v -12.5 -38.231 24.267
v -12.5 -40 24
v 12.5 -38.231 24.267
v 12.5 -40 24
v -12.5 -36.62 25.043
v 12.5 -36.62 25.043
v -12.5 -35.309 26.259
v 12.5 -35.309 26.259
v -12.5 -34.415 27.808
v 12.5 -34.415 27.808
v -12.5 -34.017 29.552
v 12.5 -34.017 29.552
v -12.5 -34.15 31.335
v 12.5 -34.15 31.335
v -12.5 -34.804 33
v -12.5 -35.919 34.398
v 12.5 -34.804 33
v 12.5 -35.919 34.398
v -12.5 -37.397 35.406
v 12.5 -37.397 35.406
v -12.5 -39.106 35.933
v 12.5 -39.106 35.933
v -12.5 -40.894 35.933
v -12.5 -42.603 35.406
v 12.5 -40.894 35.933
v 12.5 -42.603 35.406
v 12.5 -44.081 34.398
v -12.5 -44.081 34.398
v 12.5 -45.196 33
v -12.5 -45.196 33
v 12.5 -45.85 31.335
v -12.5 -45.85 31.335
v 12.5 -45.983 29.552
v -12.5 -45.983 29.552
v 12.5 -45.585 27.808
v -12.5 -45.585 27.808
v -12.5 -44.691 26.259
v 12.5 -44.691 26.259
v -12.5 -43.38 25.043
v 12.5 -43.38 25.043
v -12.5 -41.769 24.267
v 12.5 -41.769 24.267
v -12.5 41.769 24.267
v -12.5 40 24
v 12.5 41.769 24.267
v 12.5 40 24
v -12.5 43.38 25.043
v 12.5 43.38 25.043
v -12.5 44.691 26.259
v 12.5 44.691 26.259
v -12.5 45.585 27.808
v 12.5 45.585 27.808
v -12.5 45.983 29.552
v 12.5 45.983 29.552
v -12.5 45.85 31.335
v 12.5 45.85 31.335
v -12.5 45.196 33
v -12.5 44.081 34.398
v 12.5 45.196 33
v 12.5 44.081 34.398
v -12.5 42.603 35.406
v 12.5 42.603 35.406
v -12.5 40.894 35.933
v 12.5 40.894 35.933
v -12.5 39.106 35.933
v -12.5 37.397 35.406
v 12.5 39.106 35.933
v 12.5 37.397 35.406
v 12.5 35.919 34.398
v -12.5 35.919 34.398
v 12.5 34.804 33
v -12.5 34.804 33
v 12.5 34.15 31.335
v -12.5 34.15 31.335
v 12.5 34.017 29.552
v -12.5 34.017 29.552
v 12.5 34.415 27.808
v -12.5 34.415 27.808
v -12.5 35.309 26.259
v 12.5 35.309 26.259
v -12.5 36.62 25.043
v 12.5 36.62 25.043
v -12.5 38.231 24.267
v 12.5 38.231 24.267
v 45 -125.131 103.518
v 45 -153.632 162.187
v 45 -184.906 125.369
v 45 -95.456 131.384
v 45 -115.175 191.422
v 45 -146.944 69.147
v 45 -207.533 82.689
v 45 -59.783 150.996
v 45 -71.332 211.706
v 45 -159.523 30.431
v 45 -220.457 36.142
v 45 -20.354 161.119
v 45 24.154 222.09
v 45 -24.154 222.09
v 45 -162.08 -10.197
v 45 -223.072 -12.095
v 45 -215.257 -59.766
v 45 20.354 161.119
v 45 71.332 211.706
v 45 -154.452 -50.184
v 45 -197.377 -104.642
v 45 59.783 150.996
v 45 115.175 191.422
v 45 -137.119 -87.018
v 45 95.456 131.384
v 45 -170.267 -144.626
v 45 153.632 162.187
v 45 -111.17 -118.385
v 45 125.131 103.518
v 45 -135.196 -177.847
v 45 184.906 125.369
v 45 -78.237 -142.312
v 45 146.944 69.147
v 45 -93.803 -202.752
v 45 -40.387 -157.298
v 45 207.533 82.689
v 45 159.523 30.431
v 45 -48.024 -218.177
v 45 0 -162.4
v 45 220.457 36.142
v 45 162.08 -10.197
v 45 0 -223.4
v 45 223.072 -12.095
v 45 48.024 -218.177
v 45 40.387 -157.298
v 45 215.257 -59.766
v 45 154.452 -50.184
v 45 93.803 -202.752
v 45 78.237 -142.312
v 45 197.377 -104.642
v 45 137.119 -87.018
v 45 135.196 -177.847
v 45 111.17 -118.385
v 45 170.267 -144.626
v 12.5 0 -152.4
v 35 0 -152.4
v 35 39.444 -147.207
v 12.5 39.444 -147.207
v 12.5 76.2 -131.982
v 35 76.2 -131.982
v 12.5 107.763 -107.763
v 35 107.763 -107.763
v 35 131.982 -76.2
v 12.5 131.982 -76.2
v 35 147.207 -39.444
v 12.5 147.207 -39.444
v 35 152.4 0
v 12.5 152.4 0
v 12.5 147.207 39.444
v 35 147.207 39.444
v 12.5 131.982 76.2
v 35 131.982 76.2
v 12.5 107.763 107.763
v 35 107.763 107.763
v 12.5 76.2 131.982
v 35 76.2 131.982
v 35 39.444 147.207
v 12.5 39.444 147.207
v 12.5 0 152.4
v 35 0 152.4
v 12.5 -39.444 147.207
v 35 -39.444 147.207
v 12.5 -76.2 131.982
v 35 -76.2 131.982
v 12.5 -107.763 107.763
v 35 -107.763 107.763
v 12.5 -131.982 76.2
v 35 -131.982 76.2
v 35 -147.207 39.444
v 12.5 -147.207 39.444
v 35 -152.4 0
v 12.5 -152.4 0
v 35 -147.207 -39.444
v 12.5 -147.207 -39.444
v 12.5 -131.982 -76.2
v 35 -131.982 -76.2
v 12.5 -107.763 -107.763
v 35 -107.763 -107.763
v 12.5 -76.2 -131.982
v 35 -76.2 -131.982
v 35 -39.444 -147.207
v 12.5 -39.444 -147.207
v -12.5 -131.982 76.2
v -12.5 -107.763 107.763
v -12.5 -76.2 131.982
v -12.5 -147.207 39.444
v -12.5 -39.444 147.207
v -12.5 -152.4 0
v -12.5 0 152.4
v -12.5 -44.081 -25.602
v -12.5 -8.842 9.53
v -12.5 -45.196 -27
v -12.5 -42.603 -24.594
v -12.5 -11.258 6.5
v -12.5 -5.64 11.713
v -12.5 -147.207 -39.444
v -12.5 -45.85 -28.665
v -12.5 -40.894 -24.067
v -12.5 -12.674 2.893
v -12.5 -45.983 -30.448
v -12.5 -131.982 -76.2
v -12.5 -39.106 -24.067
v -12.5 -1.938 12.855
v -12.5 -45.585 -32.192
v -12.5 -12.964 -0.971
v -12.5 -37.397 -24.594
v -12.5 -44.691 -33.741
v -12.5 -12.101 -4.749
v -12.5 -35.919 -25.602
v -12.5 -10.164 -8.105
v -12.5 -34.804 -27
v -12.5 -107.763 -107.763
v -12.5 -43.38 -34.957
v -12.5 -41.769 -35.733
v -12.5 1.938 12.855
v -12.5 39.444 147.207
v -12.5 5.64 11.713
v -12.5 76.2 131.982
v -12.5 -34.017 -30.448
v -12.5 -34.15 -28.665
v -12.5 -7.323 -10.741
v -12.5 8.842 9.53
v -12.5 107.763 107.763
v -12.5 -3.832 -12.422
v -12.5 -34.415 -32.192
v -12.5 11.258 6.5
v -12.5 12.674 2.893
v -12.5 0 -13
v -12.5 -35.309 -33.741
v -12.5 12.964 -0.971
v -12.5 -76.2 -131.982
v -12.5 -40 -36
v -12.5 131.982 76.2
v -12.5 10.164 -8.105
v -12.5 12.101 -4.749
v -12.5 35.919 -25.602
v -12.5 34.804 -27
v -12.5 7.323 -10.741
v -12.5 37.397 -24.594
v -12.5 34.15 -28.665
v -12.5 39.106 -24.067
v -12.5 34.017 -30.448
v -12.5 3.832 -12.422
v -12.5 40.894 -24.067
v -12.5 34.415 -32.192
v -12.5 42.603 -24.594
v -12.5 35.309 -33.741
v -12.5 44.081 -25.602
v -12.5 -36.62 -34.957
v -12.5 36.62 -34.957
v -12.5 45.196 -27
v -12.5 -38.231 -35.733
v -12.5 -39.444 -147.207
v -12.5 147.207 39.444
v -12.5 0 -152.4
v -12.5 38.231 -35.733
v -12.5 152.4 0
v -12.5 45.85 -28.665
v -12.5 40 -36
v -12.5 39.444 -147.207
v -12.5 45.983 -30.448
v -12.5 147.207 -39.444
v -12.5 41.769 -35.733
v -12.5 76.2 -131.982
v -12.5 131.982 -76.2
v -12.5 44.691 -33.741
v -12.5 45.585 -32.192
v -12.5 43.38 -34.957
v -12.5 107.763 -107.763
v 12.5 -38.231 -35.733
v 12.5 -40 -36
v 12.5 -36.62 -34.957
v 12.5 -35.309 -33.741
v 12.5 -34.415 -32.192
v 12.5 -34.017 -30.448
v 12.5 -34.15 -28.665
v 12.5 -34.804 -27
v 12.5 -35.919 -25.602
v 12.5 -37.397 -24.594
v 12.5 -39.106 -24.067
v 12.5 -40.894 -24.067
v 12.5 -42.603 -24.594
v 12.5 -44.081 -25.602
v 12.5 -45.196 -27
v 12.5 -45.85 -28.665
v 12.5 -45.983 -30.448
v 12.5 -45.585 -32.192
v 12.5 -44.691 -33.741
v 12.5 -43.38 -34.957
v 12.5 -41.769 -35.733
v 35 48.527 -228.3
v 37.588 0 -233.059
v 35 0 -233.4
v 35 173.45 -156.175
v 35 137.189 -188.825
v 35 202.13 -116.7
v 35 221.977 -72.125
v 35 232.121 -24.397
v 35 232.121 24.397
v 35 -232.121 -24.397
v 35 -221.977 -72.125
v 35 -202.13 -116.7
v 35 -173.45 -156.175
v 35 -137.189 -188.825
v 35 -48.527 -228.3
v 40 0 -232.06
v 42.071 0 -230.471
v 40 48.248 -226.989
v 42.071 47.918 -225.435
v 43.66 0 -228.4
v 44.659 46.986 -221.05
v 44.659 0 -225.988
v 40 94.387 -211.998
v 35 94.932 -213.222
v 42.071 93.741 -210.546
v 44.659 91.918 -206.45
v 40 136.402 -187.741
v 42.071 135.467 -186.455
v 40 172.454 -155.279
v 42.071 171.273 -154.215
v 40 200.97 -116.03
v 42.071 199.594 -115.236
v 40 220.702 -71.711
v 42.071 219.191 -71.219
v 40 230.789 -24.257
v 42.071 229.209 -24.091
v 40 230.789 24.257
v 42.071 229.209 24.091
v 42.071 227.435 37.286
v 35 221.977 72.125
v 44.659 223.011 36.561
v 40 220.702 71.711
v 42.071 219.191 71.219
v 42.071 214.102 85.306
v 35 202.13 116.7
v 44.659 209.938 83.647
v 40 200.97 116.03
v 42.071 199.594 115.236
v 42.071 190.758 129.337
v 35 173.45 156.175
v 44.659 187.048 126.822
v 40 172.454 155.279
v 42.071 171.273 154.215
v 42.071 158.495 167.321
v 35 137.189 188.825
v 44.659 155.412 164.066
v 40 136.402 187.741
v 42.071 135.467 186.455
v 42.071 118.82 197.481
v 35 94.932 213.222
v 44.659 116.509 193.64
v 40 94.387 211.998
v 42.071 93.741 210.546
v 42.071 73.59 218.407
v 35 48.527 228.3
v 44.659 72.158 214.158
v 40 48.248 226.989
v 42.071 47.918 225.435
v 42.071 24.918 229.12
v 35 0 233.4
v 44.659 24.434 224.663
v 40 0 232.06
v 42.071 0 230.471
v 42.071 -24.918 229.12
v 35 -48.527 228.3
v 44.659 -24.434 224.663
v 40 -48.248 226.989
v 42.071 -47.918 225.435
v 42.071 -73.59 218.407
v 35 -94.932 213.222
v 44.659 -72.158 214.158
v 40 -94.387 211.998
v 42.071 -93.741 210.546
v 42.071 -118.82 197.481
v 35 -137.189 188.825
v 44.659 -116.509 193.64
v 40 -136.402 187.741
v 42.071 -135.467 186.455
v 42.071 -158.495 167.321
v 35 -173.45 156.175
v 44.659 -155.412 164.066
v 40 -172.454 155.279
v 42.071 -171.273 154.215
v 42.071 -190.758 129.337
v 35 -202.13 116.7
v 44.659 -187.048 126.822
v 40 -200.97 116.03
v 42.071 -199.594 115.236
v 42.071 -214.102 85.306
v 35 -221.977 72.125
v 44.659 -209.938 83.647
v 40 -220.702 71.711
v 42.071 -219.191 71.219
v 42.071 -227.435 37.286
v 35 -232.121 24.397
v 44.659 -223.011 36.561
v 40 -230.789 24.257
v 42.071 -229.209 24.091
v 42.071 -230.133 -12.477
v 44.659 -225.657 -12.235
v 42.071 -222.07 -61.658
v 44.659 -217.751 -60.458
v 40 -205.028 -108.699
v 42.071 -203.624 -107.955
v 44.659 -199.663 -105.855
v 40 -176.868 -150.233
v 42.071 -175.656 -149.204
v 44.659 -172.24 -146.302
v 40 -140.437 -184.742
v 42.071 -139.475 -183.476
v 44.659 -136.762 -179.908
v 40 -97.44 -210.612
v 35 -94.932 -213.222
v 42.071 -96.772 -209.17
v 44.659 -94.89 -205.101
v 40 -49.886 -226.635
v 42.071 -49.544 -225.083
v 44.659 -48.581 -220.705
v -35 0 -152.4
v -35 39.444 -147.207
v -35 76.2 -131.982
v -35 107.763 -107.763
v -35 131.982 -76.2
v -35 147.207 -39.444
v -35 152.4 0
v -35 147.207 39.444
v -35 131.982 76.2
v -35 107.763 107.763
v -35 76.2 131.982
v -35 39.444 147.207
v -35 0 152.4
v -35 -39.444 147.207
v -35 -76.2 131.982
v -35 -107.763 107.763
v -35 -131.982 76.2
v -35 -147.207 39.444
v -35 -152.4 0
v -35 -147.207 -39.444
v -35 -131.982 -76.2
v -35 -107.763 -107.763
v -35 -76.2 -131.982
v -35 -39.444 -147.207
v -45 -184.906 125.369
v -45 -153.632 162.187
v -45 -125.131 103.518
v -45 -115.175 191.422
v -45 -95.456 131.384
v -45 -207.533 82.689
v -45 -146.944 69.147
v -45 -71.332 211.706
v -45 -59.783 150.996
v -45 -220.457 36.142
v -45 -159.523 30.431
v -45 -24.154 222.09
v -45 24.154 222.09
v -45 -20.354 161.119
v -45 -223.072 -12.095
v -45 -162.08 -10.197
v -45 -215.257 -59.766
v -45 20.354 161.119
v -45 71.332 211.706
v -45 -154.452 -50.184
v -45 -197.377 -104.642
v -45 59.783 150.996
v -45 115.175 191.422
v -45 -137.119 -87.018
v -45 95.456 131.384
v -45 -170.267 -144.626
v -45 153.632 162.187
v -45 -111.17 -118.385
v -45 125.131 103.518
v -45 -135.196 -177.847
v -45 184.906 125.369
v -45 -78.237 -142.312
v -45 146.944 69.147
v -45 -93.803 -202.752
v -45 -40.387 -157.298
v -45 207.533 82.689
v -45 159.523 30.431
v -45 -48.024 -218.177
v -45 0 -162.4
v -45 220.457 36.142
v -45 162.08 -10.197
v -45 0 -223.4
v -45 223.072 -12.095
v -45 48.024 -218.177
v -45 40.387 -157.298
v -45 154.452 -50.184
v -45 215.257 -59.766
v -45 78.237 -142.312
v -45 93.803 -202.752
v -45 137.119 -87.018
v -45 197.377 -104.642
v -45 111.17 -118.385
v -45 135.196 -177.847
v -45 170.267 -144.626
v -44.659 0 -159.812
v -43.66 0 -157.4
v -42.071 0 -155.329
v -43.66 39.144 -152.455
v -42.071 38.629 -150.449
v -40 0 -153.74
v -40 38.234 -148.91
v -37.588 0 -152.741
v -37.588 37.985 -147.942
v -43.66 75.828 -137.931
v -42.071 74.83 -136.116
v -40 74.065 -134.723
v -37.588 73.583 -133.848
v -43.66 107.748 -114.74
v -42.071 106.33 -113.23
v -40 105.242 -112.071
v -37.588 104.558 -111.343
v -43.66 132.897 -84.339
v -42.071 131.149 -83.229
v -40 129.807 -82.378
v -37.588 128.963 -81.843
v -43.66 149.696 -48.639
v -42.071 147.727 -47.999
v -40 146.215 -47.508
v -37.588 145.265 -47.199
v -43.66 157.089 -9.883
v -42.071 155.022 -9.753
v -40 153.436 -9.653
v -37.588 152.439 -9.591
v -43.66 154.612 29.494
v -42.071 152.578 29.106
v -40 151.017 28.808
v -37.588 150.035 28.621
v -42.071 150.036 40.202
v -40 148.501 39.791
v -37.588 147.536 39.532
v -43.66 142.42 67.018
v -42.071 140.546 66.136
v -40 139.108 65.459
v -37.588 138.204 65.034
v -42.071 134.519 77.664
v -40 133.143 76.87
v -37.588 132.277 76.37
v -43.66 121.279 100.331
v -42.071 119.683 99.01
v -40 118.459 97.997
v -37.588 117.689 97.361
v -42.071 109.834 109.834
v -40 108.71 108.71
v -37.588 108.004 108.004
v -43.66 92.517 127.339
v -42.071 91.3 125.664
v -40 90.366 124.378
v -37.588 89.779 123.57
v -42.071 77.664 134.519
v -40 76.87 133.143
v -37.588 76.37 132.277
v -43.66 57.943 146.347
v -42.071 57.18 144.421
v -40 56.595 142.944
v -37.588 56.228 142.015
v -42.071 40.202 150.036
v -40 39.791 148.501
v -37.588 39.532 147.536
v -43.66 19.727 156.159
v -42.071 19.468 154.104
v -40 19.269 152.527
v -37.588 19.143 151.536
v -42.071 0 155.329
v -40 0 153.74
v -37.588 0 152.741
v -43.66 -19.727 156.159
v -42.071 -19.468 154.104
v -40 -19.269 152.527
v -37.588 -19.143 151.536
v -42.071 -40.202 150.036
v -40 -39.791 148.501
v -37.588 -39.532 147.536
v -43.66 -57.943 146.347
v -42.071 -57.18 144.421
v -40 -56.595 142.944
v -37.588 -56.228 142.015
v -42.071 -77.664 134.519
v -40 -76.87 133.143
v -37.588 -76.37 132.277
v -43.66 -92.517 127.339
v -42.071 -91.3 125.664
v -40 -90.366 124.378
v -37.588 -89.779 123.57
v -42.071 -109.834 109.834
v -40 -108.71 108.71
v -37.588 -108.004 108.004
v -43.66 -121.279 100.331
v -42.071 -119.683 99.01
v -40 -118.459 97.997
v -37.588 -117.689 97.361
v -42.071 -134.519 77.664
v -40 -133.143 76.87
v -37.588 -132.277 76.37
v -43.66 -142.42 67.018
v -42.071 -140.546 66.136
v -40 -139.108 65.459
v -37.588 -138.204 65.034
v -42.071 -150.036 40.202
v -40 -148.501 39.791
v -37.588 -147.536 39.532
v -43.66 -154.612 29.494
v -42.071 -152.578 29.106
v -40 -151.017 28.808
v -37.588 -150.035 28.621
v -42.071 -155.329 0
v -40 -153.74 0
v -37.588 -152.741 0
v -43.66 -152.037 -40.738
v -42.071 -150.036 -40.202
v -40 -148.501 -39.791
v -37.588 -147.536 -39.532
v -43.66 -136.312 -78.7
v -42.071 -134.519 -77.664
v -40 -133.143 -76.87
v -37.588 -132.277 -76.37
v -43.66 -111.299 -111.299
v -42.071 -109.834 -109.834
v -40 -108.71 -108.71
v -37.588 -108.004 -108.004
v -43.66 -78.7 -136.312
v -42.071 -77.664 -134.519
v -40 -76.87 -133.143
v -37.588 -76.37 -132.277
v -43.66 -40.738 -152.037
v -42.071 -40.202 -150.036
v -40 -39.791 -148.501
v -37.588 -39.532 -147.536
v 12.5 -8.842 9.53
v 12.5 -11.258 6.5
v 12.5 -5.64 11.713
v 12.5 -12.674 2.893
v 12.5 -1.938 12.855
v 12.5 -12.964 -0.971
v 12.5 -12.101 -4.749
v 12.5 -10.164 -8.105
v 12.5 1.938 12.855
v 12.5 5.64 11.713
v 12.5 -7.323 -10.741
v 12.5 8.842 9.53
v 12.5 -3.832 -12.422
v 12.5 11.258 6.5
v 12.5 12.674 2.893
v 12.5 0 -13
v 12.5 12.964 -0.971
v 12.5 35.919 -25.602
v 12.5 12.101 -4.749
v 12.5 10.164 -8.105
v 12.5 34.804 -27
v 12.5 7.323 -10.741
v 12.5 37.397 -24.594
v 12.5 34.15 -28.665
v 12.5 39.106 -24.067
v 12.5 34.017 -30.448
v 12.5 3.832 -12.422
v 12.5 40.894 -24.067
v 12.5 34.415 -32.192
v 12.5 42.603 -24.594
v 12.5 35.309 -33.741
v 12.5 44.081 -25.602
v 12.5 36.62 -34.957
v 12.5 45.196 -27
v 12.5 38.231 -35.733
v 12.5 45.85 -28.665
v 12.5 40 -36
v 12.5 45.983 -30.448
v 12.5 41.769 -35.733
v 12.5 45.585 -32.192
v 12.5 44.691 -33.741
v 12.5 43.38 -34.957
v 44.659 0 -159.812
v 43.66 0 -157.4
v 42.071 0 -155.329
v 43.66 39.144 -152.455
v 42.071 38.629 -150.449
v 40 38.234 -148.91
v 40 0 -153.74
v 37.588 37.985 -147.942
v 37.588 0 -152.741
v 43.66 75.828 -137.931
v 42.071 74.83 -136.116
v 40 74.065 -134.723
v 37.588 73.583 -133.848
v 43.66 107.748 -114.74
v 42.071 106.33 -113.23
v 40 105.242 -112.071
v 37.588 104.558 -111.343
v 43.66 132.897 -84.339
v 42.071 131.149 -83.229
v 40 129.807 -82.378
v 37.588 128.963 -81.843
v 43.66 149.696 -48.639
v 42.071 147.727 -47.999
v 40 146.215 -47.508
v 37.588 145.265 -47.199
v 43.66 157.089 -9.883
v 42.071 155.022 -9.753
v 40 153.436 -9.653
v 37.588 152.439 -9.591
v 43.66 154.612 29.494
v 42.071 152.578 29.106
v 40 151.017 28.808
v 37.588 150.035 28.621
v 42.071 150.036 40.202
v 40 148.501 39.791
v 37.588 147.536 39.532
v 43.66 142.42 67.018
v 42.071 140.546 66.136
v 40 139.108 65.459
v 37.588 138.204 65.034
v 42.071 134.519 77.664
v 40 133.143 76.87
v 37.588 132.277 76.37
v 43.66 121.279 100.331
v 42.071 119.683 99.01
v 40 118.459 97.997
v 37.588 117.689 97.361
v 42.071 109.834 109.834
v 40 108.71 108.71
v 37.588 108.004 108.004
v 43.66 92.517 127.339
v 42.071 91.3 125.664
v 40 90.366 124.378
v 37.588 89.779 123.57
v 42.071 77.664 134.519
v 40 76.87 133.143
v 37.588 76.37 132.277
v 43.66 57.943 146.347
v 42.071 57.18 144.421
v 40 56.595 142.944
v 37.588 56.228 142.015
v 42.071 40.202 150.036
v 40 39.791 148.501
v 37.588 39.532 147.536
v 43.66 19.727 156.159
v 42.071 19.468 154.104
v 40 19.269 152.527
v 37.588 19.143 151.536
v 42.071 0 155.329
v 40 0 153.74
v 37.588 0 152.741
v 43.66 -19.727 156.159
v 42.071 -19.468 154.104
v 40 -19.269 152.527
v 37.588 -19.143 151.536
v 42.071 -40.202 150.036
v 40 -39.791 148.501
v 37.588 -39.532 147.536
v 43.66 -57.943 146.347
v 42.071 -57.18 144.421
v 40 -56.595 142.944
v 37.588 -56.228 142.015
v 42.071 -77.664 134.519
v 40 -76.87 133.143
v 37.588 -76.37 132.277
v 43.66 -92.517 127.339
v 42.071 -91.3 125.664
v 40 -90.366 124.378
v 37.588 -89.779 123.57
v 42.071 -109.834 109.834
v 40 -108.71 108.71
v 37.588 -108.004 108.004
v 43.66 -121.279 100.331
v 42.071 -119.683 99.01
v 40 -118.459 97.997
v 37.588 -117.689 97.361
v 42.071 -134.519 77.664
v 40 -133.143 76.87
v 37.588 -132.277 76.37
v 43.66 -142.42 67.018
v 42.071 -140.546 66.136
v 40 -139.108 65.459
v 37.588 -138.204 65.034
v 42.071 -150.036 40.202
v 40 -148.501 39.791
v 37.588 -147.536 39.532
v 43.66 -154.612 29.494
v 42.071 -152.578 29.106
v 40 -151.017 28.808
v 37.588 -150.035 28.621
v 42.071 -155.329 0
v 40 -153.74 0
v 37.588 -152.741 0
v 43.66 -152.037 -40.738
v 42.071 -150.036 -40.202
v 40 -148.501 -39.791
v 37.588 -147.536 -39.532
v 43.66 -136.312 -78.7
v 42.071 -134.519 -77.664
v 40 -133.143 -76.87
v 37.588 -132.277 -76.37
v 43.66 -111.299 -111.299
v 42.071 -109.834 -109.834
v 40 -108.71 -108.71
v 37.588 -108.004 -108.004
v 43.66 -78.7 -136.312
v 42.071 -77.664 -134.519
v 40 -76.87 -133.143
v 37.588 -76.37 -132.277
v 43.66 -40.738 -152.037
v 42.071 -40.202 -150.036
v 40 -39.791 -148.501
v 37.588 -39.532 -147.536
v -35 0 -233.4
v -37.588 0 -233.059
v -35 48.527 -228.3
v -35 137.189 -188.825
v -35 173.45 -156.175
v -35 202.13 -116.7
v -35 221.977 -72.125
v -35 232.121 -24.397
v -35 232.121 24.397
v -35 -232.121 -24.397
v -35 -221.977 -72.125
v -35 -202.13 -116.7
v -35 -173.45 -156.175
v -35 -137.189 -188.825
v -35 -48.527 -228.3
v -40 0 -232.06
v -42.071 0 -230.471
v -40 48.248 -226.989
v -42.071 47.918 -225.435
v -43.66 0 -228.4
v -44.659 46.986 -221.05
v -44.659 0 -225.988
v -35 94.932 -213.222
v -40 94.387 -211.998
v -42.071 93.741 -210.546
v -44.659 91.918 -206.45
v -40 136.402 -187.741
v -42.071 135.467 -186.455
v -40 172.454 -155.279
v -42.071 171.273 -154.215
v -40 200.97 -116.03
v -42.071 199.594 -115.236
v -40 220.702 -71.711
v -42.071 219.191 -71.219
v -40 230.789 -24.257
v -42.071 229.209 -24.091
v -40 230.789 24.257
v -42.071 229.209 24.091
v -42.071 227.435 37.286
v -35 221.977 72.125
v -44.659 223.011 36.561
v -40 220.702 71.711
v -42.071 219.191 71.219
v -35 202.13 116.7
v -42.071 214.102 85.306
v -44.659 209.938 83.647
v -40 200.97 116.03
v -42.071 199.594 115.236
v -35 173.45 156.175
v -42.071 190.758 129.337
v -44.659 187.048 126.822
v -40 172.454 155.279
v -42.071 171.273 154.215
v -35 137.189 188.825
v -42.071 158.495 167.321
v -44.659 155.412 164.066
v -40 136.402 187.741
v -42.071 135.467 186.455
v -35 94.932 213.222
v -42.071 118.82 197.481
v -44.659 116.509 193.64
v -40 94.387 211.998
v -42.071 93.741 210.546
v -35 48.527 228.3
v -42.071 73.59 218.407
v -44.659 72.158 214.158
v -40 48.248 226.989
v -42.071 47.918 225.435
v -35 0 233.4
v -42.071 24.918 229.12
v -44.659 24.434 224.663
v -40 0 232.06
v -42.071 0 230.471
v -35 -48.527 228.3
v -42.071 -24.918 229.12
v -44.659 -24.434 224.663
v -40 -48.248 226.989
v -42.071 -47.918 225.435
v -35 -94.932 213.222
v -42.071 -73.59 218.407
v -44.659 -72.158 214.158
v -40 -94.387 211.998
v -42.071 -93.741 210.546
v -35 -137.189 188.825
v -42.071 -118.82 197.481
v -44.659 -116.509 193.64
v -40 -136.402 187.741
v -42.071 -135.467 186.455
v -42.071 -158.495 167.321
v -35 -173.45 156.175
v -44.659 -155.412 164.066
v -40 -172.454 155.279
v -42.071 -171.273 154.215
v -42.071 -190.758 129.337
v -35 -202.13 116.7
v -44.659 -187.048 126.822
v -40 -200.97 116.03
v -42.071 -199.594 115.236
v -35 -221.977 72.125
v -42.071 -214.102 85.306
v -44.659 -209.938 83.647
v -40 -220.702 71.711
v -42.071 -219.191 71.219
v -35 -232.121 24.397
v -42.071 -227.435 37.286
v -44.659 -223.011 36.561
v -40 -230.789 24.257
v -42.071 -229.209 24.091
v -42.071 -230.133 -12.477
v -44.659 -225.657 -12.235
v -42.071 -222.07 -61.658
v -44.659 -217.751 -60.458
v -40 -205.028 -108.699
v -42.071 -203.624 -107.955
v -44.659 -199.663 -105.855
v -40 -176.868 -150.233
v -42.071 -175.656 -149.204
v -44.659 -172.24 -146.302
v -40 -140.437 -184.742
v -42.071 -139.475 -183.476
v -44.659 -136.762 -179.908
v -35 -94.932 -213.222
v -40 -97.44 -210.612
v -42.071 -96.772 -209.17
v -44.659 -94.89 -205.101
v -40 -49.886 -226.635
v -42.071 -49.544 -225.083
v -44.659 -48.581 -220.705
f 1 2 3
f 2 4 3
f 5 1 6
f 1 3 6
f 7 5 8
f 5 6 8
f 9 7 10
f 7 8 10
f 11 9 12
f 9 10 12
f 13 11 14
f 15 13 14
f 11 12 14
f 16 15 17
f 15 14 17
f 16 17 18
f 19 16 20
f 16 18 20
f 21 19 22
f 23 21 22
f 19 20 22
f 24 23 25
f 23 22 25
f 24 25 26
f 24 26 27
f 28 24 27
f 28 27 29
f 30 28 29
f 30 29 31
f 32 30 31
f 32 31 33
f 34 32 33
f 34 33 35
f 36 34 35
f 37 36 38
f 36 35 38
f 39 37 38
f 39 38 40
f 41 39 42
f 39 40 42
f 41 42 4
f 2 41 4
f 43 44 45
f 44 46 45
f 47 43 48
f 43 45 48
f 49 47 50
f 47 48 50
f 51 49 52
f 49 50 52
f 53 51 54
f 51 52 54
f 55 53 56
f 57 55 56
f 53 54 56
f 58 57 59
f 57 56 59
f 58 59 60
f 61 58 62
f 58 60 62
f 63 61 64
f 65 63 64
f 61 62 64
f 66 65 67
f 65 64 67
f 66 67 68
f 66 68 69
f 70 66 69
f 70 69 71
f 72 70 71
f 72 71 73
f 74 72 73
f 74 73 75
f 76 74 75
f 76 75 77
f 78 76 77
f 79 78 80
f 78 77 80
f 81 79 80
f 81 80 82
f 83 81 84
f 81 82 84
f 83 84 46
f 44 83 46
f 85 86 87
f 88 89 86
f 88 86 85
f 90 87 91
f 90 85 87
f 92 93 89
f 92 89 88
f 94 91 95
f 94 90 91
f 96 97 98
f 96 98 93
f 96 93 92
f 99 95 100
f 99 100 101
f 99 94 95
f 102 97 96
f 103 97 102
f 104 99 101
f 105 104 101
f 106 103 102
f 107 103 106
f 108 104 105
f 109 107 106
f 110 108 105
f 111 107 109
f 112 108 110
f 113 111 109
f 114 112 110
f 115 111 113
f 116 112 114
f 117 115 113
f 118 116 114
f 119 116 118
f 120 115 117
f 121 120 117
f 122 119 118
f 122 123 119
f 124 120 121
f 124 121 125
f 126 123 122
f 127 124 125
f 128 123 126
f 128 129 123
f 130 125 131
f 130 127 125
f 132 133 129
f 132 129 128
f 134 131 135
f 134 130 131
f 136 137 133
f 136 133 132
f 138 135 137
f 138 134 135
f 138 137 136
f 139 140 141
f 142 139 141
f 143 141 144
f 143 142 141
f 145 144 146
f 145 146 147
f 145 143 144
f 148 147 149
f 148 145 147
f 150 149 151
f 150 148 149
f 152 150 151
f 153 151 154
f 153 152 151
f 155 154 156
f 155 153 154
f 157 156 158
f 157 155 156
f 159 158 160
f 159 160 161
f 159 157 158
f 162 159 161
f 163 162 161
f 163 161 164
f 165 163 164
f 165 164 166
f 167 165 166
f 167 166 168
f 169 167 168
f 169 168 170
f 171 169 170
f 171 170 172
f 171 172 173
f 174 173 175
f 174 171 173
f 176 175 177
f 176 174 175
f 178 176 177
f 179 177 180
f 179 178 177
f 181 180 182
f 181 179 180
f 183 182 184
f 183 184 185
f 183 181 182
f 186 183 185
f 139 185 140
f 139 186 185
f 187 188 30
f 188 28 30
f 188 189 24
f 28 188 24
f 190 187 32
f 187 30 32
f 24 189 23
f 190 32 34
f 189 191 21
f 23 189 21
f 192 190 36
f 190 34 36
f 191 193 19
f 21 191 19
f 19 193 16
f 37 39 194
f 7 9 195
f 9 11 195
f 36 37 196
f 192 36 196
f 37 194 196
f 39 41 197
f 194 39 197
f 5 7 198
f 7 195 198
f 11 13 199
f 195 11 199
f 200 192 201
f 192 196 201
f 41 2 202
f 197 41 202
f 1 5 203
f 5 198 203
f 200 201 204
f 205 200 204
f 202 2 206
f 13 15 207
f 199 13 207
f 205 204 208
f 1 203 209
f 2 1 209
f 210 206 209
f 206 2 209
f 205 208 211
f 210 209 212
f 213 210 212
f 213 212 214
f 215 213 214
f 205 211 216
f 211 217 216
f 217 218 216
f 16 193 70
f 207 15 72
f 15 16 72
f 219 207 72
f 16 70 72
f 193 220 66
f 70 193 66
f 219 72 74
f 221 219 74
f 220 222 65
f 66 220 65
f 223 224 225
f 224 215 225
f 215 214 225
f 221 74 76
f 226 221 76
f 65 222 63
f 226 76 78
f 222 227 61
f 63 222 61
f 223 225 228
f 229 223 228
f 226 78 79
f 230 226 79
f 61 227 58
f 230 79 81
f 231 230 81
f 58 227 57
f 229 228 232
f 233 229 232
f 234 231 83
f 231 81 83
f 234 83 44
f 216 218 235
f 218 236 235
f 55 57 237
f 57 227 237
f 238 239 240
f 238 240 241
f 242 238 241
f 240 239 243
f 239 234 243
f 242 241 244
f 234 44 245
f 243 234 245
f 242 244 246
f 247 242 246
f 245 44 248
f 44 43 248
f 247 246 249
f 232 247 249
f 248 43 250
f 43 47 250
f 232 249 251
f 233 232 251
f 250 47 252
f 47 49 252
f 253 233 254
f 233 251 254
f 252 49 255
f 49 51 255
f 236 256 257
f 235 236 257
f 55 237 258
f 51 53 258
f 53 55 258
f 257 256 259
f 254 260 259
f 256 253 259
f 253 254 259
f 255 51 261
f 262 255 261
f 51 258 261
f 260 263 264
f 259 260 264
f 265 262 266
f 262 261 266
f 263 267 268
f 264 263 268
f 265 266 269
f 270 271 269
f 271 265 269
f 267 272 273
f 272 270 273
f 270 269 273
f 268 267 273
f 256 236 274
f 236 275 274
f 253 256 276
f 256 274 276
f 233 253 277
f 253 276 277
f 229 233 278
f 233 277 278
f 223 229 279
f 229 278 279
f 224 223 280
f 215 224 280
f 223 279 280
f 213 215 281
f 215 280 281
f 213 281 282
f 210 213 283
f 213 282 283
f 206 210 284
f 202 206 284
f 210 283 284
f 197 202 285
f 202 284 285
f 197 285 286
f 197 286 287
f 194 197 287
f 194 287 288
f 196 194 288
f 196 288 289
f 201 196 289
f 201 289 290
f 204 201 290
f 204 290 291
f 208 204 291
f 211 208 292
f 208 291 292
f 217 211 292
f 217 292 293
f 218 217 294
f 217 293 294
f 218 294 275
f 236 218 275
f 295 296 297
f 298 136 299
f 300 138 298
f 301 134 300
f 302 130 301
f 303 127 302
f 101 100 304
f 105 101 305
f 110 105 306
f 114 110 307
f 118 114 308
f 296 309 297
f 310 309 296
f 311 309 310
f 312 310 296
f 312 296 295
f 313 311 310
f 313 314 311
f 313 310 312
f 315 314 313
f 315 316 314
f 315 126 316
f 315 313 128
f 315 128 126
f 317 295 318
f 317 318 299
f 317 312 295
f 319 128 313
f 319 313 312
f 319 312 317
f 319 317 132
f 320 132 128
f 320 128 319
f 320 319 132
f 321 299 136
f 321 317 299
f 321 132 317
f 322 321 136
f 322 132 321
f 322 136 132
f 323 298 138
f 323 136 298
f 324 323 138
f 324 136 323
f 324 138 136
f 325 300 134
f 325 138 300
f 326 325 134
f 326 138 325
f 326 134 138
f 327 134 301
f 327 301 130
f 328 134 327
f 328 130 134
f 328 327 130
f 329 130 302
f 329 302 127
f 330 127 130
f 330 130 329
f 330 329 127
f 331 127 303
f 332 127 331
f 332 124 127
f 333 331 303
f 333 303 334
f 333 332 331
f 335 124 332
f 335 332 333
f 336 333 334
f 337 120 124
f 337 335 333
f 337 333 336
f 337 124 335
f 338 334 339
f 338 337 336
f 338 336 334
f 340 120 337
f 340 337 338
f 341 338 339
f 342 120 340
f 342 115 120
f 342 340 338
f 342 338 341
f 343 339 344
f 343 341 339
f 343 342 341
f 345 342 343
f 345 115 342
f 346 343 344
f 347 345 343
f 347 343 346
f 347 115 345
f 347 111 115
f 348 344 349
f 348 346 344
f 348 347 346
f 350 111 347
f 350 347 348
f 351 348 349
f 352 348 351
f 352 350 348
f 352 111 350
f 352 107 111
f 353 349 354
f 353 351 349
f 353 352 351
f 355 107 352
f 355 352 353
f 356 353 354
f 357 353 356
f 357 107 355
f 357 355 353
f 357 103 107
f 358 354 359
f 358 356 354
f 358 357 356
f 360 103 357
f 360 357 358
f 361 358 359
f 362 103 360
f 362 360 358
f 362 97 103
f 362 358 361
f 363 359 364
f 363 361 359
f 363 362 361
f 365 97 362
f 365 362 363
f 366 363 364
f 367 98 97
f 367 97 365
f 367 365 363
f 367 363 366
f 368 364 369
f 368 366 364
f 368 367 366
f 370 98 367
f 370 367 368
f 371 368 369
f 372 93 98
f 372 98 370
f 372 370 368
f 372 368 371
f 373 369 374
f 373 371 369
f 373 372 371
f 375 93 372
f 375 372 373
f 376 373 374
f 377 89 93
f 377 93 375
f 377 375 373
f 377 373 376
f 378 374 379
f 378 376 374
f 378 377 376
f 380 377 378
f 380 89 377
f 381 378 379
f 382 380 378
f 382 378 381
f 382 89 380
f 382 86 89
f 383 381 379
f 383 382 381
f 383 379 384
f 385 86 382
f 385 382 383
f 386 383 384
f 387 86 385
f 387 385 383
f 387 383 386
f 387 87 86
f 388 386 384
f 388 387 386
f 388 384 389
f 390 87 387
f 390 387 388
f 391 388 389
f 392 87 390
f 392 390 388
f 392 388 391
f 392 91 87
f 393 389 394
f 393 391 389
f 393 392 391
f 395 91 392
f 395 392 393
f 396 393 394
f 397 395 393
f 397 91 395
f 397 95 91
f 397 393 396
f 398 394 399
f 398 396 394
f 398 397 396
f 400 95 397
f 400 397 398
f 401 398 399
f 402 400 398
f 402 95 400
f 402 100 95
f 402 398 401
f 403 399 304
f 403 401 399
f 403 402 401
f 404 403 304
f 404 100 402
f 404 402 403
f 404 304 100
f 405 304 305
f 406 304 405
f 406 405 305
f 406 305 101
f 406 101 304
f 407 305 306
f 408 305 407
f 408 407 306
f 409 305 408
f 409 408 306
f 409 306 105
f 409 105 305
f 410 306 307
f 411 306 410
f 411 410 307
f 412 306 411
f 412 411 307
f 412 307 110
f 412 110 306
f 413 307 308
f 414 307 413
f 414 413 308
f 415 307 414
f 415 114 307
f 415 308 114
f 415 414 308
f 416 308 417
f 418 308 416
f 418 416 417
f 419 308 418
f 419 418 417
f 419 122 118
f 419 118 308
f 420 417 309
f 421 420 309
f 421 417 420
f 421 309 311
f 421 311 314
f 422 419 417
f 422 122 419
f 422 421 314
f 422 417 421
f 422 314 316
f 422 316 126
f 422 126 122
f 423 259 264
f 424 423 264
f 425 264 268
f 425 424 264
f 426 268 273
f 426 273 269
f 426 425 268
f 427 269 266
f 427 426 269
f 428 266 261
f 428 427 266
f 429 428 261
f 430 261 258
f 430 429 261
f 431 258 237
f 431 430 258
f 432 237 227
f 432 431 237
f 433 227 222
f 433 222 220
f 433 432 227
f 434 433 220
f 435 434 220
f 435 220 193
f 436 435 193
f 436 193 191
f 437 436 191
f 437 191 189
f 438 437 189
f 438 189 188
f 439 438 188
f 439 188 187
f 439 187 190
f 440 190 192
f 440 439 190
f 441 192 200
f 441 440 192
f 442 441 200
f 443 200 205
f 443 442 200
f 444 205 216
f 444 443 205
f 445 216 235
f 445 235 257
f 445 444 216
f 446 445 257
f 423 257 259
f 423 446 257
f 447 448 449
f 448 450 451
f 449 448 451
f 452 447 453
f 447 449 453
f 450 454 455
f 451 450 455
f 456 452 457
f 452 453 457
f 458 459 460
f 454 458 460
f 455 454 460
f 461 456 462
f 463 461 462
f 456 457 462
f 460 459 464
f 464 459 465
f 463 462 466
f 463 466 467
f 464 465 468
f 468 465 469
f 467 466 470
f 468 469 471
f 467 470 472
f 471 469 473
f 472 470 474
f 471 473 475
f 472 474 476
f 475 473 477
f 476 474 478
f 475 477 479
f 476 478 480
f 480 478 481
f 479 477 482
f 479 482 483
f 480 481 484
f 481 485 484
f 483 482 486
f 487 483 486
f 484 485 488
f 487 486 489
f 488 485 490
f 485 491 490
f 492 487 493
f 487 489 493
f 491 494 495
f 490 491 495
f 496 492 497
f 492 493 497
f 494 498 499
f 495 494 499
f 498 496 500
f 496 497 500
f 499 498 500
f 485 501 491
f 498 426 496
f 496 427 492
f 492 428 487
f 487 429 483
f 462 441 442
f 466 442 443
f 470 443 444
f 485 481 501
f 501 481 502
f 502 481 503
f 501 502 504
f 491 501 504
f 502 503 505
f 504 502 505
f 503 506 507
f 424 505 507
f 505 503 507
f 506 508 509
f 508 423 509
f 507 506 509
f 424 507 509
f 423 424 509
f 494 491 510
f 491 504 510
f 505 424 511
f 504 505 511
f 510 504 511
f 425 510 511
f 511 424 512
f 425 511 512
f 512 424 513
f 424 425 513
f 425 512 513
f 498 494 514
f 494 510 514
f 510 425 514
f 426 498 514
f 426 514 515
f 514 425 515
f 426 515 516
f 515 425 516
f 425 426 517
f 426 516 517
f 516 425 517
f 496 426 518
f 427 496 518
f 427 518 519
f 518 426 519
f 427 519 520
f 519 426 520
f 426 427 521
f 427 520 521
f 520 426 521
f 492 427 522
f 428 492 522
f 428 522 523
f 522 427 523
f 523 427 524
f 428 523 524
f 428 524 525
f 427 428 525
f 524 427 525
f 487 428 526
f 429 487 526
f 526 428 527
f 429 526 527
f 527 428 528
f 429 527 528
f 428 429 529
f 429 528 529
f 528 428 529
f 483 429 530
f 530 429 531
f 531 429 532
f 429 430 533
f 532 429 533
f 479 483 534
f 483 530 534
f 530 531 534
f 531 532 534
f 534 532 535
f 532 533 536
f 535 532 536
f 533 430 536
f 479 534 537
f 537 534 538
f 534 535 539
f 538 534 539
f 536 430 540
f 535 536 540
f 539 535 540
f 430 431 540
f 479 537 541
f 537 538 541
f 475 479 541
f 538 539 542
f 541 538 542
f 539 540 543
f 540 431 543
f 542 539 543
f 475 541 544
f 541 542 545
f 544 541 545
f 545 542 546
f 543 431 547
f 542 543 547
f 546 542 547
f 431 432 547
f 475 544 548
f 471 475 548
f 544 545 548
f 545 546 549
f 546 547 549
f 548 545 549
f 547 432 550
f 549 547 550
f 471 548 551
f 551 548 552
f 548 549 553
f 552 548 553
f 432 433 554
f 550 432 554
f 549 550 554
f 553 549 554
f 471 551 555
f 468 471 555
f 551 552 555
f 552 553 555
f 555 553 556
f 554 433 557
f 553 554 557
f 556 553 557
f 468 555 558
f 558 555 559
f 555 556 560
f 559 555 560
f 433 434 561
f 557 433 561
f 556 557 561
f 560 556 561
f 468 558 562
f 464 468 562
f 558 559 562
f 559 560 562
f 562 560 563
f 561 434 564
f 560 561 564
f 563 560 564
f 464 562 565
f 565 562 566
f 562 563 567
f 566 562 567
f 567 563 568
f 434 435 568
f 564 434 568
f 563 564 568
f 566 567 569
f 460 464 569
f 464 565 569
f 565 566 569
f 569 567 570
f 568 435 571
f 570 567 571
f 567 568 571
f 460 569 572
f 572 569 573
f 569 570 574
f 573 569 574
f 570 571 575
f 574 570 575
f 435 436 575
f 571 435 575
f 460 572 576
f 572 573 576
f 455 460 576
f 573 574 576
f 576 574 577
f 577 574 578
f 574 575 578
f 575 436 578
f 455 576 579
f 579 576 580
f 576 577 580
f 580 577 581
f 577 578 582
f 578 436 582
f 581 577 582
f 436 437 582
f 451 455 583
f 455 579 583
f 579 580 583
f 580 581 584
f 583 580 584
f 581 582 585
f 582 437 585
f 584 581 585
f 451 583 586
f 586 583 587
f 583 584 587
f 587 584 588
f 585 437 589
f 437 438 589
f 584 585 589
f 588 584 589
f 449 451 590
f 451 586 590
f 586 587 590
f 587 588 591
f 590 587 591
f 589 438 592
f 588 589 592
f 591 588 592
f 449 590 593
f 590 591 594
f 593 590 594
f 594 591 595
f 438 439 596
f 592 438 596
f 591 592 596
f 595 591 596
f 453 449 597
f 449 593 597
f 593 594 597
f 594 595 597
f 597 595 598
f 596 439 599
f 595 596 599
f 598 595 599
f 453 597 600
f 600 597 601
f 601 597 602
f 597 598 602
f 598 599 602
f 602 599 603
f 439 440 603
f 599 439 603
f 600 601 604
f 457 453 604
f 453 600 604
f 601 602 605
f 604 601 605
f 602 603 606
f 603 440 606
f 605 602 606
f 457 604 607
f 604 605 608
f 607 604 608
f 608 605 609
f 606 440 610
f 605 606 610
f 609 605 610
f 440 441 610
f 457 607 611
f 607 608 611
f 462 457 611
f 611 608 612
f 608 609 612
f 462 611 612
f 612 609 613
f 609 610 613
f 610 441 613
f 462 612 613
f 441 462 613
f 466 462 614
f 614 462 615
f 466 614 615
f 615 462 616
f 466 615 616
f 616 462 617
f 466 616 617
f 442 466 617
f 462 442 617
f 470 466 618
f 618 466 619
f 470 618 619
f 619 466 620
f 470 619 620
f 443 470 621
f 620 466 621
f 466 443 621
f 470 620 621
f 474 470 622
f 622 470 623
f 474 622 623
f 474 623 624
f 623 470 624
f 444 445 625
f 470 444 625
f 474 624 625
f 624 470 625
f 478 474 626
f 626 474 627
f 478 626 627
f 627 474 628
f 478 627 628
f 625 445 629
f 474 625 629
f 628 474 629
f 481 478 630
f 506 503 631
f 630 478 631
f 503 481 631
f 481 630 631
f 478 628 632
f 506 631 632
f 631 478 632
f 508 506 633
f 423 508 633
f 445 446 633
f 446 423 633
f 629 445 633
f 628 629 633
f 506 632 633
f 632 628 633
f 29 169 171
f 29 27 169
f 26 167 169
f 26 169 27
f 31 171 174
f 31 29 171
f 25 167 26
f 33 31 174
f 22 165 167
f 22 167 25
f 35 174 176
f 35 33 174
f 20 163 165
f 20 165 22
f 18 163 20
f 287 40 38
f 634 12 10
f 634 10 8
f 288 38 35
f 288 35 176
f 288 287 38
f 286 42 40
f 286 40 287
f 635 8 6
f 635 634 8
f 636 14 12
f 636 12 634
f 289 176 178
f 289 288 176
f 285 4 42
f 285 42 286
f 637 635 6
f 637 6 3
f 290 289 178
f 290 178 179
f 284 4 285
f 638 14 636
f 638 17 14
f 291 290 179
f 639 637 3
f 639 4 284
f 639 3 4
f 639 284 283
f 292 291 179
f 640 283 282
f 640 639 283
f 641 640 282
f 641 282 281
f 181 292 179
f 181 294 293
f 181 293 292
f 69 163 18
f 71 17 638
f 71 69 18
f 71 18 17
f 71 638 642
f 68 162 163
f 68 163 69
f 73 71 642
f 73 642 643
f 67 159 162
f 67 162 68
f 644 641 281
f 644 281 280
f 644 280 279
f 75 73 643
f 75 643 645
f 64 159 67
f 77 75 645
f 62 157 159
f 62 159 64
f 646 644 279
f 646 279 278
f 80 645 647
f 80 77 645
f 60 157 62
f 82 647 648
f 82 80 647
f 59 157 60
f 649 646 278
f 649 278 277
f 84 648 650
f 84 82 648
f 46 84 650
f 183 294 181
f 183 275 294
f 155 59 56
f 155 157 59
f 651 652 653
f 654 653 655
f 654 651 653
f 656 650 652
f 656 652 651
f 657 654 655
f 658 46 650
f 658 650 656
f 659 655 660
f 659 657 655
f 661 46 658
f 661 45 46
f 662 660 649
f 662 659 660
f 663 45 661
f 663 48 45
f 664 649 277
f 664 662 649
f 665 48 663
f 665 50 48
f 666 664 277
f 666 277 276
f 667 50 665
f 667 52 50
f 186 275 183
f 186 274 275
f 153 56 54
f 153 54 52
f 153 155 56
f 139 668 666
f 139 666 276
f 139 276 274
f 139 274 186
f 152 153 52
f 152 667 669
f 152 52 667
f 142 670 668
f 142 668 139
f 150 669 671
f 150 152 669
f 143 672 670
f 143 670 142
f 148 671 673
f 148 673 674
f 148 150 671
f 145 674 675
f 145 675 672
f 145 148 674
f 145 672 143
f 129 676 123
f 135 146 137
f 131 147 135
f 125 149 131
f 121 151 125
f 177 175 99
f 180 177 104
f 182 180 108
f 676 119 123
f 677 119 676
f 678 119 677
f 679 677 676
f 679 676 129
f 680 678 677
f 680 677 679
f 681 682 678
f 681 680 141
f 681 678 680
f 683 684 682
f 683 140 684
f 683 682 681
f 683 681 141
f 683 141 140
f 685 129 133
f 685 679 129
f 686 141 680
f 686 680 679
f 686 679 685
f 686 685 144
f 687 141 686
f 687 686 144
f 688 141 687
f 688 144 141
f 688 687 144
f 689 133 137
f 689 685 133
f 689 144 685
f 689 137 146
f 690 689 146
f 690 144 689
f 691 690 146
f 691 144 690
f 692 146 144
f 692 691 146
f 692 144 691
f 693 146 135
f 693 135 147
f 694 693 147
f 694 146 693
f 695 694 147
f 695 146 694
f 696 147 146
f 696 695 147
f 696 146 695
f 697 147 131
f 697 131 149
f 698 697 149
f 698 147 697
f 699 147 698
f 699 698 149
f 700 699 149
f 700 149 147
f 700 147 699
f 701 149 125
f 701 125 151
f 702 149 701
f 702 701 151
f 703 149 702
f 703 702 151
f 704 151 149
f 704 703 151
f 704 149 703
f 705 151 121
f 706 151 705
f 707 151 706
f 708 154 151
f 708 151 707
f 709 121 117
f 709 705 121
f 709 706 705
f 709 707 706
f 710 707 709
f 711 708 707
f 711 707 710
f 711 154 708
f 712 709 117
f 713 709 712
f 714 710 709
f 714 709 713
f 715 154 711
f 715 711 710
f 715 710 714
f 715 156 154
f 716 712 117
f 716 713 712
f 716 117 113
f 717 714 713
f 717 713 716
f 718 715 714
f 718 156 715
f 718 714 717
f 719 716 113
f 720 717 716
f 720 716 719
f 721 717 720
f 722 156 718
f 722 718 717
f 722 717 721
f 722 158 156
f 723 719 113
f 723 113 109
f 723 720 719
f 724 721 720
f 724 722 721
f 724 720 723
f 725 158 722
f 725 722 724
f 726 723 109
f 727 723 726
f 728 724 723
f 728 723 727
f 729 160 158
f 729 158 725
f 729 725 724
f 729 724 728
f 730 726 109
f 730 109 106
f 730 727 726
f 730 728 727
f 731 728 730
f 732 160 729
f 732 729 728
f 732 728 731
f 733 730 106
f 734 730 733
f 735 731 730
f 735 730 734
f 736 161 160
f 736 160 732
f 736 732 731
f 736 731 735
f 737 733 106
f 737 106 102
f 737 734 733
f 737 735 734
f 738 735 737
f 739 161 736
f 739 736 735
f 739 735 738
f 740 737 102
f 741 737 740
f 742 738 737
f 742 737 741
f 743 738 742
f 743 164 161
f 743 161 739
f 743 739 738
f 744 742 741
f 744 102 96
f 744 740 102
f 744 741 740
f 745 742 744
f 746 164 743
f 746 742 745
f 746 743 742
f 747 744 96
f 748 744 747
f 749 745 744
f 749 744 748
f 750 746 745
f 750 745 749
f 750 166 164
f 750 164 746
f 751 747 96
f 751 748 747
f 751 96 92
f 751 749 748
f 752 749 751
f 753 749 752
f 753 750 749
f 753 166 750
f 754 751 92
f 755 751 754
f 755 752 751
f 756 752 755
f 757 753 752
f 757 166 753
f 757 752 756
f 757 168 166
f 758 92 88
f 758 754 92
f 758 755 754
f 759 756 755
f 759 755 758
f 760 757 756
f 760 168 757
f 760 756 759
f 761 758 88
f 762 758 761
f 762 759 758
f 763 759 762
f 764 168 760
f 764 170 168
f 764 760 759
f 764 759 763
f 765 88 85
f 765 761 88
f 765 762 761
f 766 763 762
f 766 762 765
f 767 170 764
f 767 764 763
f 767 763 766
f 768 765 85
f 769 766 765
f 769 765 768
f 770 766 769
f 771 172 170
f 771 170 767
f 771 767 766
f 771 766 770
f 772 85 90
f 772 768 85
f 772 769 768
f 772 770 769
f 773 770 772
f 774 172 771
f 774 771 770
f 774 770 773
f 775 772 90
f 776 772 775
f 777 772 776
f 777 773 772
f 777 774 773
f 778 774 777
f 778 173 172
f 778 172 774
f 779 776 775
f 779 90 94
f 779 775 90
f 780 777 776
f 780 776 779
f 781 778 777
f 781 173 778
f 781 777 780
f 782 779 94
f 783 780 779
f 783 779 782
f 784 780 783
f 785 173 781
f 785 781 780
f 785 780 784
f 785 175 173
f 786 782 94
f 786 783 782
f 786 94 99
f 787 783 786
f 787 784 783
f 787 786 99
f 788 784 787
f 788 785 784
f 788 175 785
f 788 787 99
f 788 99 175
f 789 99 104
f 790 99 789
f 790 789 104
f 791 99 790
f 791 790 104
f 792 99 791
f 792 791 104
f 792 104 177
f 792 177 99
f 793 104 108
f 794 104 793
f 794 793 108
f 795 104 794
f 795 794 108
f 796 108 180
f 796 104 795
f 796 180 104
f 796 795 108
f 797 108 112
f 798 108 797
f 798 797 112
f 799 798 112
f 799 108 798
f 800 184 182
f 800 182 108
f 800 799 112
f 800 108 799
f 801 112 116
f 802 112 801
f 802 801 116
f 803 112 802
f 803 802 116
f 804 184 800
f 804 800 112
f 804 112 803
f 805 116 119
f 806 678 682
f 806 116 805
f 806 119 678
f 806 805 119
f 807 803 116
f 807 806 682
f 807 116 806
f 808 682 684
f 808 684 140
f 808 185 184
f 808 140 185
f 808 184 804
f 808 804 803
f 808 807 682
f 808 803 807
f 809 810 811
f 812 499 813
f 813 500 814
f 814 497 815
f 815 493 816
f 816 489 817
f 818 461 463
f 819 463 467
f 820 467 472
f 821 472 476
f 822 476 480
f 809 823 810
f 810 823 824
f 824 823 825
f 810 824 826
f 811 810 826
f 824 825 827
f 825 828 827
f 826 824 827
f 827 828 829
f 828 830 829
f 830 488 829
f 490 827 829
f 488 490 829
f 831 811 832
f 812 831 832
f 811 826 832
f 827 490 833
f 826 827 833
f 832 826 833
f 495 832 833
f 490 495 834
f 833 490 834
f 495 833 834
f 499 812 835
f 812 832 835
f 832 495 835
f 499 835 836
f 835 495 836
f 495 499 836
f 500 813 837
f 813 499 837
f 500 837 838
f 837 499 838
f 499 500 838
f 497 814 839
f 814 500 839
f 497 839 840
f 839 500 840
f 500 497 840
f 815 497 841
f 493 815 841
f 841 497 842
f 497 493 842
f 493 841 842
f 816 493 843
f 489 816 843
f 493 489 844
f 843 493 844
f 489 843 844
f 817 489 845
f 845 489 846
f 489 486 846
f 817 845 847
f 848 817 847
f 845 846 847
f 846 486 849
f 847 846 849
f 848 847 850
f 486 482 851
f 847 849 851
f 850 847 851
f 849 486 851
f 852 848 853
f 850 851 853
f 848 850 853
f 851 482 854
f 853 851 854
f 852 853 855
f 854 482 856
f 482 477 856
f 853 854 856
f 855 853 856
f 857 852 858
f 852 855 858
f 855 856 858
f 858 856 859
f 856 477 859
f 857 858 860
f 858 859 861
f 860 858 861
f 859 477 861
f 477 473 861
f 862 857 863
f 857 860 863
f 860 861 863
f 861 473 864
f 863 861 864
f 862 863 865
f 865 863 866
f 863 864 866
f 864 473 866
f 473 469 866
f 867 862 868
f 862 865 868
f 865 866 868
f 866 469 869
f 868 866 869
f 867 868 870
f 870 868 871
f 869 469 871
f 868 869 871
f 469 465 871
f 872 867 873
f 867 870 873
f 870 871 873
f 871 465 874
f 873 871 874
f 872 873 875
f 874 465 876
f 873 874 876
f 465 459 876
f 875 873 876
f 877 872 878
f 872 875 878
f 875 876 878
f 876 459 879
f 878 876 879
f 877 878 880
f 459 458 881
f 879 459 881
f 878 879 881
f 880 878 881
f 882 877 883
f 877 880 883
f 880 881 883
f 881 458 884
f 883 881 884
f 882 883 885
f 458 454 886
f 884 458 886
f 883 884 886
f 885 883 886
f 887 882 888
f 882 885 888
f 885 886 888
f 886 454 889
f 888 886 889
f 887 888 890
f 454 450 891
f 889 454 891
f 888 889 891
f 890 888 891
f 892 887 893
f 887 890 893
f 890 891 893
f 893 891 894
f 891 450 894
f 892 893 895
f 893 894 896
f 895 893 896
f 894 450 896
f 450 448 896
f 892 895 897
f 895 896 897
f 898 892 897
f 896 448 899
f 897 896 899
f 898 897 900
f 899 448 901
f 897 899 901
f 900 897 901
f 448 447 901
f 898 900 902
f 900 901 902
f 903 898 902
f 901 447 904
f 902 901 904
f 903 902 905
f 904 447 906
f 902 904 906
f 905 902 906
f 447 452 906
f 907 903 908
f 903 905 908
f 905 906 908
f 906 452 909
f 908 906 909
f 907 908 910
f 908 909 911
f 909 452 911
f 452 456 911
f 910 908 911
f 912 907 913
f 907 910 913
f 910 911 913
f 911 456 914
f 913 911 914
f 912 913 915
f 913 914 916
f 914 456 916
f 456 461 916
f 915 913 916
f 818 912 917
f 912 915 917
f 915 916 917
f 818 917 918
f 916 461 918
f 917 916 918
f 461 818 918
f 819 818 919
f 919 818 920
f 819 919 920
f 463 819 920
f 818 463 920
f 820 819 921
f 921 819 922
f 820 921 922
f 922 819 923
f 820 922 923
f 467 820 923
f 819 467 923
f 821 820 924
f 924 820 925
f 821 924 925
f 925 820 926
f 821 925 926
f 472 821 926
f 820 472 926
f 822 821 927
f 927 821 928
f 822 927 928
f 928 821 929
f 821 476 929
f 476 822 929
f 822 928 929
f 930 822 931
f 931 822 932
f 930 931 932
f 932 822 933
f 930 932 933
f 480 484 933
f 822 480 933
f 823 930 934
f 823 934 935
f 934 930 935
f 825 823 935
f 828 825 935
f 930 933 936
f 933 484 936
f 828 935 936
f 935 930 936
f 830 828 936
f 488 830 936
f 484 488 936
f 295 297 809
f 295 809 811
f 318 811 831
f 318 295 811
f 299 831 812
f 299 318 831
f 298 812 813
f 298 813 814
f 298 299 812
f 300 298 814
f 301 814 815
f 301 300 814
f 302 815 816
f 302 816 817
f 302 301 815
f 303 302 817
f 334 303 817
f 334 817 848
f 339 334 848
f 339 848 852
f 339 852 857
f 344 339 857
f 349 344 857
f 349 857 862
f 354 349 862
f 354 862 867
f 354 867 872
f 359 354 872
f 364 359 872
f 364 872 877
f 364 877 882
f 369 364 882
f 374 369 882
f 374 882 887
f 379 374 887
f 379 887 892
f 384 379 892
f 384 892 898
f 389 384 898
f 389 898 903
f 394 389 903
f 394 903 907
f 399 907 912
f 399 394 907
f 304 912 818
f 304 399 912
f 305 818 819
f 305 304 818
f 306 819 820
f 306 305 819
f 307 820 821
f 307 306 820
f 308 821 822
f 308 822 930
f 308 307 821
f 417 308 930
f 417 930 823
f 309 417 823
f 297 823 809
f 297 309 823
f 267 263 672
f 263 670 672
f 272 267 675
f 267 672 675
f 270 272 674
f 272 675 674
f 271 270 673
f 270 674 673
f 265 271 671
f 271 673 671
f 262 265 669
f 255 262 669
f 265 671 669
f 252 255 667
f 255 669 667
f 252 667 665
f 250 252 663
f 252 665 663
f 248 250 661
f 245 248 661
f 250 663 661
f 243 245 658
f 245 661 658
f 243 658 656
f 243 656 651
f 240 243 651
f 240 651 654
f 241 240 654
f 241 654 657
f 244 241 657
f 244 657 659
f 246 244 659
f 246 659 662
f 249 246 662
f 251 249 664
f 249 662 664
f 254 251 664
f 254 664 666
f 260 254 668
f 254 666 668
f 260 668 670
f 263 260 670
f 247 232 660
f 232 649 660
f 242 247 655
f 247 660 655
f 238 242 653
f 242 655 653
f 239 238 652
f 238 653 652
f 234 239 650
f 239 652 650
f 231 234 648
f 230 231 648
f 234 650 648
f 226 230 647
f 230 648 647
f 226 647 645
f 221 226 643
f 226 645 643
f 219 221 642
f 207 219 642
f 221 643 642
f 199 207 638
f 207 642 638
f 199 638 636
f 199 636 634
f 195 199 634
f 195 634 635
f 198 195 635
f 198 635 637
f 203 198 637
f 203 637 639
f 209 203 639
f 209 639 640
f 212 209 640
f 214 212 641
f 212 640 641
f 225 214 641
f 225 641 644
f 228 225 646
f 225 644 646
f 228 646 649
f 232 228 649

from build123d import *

# Parameters (mm, degrees)
SKETCH1_R               = 233.4
SKETCH1_R_2             = 152.4
BOSS_EXTRUDE1_DEPTH     = 45
SKETCH2_R               = 152.4
BOSS_EXTRUDE2_DEPTH     = 12.5
FILLET2_R               = 10
FILLET3_R               = 10
FILLET4_R               = 10
SKETCH3_R               = 13
SKETCH3_R_2             = 6
CUT_EXTRUDE2_DEPTH      = 46
CUT_EXTRUDE2_DEPTH_BACK = 46


with BuildPart() as part:
    # Sketch1 → Boss-Extrude1 (new body, symmetric)
    with BuildSketch(Plane(origin=(0, 0, 0), x_dir=(0, 0, -1), z_dir=(1, 0, 0))):
        Circle(SKETCH1_R)
        Circle(SKETCH1_R_2, mode=Mode.SUBTRACT)
    extrude(amount=BOSS_EXTRUDE1_DEPTH, both=True)

    # Sketch2 → Boss-Extrude2 (add, symmetric)
    with BuildSketch(Plane(origin=(0, 0, 0), x_dir=(0, 0, -1), z_dir=(1, 0, 0))):
        Circle(SKETCH2_R)
    extrude(amount=BOSS_EXTRUDE2_DEPTH, both=True)

    # Fillet2
    fillet2_edges = [part.edges().sort_by_distance(p)[0] for p in [
        (45, 0, 233.4),
    ]]
    fillet(fillet2_edges, radius=FILLET2_R)

    # Fillet3
    fillet3_edges = [part.edges().sort_by_distance(p)[0] for p in [
        (-45, 0, 233.4),
        (45, 0, 152.4),
    ]]
    fillet(fillet3_edges, radius=FILLET3_R)

    # Fillet4
    fillet4_edges = [part.edges().sort_by_distance(p)[0] for p in [
        (-45, 0, 152.4),
    ]]
    fillet(fillet4_edges, radius=FILLET4_R)

    # Sketch3 → Cut-Extrude2 (cut, two sides)
    with BuildSketch(Plane(origin=(0, 0, 0), x_dir=(0, 0, -1), z_dir=(1, 0, 0))) as cut_extrude2_sk:
        Circle(SKETCH3_R)
        with Locations((30, 40)):
            Circle(SKETCH3_R_2)
        with Locations((-30, 40)):
            Circle(SKETCH3_R_2)
        with Locations((-30, -40)):
            Circle(SKETCH3_R_2)
        with Locations((30, -40)):
            Circle(SKETCH3_R_2)
    extrude(amount=CUT_EXTRUDE2_DEPTH, mode=Mode.SUBTRACT)
    extrude(cut_extrude2_sk.sketch, amount=-CUT_EXTRUDE2_DEPTH_BACK, mode=Mode.SUBTRACT)


solid = part.part
